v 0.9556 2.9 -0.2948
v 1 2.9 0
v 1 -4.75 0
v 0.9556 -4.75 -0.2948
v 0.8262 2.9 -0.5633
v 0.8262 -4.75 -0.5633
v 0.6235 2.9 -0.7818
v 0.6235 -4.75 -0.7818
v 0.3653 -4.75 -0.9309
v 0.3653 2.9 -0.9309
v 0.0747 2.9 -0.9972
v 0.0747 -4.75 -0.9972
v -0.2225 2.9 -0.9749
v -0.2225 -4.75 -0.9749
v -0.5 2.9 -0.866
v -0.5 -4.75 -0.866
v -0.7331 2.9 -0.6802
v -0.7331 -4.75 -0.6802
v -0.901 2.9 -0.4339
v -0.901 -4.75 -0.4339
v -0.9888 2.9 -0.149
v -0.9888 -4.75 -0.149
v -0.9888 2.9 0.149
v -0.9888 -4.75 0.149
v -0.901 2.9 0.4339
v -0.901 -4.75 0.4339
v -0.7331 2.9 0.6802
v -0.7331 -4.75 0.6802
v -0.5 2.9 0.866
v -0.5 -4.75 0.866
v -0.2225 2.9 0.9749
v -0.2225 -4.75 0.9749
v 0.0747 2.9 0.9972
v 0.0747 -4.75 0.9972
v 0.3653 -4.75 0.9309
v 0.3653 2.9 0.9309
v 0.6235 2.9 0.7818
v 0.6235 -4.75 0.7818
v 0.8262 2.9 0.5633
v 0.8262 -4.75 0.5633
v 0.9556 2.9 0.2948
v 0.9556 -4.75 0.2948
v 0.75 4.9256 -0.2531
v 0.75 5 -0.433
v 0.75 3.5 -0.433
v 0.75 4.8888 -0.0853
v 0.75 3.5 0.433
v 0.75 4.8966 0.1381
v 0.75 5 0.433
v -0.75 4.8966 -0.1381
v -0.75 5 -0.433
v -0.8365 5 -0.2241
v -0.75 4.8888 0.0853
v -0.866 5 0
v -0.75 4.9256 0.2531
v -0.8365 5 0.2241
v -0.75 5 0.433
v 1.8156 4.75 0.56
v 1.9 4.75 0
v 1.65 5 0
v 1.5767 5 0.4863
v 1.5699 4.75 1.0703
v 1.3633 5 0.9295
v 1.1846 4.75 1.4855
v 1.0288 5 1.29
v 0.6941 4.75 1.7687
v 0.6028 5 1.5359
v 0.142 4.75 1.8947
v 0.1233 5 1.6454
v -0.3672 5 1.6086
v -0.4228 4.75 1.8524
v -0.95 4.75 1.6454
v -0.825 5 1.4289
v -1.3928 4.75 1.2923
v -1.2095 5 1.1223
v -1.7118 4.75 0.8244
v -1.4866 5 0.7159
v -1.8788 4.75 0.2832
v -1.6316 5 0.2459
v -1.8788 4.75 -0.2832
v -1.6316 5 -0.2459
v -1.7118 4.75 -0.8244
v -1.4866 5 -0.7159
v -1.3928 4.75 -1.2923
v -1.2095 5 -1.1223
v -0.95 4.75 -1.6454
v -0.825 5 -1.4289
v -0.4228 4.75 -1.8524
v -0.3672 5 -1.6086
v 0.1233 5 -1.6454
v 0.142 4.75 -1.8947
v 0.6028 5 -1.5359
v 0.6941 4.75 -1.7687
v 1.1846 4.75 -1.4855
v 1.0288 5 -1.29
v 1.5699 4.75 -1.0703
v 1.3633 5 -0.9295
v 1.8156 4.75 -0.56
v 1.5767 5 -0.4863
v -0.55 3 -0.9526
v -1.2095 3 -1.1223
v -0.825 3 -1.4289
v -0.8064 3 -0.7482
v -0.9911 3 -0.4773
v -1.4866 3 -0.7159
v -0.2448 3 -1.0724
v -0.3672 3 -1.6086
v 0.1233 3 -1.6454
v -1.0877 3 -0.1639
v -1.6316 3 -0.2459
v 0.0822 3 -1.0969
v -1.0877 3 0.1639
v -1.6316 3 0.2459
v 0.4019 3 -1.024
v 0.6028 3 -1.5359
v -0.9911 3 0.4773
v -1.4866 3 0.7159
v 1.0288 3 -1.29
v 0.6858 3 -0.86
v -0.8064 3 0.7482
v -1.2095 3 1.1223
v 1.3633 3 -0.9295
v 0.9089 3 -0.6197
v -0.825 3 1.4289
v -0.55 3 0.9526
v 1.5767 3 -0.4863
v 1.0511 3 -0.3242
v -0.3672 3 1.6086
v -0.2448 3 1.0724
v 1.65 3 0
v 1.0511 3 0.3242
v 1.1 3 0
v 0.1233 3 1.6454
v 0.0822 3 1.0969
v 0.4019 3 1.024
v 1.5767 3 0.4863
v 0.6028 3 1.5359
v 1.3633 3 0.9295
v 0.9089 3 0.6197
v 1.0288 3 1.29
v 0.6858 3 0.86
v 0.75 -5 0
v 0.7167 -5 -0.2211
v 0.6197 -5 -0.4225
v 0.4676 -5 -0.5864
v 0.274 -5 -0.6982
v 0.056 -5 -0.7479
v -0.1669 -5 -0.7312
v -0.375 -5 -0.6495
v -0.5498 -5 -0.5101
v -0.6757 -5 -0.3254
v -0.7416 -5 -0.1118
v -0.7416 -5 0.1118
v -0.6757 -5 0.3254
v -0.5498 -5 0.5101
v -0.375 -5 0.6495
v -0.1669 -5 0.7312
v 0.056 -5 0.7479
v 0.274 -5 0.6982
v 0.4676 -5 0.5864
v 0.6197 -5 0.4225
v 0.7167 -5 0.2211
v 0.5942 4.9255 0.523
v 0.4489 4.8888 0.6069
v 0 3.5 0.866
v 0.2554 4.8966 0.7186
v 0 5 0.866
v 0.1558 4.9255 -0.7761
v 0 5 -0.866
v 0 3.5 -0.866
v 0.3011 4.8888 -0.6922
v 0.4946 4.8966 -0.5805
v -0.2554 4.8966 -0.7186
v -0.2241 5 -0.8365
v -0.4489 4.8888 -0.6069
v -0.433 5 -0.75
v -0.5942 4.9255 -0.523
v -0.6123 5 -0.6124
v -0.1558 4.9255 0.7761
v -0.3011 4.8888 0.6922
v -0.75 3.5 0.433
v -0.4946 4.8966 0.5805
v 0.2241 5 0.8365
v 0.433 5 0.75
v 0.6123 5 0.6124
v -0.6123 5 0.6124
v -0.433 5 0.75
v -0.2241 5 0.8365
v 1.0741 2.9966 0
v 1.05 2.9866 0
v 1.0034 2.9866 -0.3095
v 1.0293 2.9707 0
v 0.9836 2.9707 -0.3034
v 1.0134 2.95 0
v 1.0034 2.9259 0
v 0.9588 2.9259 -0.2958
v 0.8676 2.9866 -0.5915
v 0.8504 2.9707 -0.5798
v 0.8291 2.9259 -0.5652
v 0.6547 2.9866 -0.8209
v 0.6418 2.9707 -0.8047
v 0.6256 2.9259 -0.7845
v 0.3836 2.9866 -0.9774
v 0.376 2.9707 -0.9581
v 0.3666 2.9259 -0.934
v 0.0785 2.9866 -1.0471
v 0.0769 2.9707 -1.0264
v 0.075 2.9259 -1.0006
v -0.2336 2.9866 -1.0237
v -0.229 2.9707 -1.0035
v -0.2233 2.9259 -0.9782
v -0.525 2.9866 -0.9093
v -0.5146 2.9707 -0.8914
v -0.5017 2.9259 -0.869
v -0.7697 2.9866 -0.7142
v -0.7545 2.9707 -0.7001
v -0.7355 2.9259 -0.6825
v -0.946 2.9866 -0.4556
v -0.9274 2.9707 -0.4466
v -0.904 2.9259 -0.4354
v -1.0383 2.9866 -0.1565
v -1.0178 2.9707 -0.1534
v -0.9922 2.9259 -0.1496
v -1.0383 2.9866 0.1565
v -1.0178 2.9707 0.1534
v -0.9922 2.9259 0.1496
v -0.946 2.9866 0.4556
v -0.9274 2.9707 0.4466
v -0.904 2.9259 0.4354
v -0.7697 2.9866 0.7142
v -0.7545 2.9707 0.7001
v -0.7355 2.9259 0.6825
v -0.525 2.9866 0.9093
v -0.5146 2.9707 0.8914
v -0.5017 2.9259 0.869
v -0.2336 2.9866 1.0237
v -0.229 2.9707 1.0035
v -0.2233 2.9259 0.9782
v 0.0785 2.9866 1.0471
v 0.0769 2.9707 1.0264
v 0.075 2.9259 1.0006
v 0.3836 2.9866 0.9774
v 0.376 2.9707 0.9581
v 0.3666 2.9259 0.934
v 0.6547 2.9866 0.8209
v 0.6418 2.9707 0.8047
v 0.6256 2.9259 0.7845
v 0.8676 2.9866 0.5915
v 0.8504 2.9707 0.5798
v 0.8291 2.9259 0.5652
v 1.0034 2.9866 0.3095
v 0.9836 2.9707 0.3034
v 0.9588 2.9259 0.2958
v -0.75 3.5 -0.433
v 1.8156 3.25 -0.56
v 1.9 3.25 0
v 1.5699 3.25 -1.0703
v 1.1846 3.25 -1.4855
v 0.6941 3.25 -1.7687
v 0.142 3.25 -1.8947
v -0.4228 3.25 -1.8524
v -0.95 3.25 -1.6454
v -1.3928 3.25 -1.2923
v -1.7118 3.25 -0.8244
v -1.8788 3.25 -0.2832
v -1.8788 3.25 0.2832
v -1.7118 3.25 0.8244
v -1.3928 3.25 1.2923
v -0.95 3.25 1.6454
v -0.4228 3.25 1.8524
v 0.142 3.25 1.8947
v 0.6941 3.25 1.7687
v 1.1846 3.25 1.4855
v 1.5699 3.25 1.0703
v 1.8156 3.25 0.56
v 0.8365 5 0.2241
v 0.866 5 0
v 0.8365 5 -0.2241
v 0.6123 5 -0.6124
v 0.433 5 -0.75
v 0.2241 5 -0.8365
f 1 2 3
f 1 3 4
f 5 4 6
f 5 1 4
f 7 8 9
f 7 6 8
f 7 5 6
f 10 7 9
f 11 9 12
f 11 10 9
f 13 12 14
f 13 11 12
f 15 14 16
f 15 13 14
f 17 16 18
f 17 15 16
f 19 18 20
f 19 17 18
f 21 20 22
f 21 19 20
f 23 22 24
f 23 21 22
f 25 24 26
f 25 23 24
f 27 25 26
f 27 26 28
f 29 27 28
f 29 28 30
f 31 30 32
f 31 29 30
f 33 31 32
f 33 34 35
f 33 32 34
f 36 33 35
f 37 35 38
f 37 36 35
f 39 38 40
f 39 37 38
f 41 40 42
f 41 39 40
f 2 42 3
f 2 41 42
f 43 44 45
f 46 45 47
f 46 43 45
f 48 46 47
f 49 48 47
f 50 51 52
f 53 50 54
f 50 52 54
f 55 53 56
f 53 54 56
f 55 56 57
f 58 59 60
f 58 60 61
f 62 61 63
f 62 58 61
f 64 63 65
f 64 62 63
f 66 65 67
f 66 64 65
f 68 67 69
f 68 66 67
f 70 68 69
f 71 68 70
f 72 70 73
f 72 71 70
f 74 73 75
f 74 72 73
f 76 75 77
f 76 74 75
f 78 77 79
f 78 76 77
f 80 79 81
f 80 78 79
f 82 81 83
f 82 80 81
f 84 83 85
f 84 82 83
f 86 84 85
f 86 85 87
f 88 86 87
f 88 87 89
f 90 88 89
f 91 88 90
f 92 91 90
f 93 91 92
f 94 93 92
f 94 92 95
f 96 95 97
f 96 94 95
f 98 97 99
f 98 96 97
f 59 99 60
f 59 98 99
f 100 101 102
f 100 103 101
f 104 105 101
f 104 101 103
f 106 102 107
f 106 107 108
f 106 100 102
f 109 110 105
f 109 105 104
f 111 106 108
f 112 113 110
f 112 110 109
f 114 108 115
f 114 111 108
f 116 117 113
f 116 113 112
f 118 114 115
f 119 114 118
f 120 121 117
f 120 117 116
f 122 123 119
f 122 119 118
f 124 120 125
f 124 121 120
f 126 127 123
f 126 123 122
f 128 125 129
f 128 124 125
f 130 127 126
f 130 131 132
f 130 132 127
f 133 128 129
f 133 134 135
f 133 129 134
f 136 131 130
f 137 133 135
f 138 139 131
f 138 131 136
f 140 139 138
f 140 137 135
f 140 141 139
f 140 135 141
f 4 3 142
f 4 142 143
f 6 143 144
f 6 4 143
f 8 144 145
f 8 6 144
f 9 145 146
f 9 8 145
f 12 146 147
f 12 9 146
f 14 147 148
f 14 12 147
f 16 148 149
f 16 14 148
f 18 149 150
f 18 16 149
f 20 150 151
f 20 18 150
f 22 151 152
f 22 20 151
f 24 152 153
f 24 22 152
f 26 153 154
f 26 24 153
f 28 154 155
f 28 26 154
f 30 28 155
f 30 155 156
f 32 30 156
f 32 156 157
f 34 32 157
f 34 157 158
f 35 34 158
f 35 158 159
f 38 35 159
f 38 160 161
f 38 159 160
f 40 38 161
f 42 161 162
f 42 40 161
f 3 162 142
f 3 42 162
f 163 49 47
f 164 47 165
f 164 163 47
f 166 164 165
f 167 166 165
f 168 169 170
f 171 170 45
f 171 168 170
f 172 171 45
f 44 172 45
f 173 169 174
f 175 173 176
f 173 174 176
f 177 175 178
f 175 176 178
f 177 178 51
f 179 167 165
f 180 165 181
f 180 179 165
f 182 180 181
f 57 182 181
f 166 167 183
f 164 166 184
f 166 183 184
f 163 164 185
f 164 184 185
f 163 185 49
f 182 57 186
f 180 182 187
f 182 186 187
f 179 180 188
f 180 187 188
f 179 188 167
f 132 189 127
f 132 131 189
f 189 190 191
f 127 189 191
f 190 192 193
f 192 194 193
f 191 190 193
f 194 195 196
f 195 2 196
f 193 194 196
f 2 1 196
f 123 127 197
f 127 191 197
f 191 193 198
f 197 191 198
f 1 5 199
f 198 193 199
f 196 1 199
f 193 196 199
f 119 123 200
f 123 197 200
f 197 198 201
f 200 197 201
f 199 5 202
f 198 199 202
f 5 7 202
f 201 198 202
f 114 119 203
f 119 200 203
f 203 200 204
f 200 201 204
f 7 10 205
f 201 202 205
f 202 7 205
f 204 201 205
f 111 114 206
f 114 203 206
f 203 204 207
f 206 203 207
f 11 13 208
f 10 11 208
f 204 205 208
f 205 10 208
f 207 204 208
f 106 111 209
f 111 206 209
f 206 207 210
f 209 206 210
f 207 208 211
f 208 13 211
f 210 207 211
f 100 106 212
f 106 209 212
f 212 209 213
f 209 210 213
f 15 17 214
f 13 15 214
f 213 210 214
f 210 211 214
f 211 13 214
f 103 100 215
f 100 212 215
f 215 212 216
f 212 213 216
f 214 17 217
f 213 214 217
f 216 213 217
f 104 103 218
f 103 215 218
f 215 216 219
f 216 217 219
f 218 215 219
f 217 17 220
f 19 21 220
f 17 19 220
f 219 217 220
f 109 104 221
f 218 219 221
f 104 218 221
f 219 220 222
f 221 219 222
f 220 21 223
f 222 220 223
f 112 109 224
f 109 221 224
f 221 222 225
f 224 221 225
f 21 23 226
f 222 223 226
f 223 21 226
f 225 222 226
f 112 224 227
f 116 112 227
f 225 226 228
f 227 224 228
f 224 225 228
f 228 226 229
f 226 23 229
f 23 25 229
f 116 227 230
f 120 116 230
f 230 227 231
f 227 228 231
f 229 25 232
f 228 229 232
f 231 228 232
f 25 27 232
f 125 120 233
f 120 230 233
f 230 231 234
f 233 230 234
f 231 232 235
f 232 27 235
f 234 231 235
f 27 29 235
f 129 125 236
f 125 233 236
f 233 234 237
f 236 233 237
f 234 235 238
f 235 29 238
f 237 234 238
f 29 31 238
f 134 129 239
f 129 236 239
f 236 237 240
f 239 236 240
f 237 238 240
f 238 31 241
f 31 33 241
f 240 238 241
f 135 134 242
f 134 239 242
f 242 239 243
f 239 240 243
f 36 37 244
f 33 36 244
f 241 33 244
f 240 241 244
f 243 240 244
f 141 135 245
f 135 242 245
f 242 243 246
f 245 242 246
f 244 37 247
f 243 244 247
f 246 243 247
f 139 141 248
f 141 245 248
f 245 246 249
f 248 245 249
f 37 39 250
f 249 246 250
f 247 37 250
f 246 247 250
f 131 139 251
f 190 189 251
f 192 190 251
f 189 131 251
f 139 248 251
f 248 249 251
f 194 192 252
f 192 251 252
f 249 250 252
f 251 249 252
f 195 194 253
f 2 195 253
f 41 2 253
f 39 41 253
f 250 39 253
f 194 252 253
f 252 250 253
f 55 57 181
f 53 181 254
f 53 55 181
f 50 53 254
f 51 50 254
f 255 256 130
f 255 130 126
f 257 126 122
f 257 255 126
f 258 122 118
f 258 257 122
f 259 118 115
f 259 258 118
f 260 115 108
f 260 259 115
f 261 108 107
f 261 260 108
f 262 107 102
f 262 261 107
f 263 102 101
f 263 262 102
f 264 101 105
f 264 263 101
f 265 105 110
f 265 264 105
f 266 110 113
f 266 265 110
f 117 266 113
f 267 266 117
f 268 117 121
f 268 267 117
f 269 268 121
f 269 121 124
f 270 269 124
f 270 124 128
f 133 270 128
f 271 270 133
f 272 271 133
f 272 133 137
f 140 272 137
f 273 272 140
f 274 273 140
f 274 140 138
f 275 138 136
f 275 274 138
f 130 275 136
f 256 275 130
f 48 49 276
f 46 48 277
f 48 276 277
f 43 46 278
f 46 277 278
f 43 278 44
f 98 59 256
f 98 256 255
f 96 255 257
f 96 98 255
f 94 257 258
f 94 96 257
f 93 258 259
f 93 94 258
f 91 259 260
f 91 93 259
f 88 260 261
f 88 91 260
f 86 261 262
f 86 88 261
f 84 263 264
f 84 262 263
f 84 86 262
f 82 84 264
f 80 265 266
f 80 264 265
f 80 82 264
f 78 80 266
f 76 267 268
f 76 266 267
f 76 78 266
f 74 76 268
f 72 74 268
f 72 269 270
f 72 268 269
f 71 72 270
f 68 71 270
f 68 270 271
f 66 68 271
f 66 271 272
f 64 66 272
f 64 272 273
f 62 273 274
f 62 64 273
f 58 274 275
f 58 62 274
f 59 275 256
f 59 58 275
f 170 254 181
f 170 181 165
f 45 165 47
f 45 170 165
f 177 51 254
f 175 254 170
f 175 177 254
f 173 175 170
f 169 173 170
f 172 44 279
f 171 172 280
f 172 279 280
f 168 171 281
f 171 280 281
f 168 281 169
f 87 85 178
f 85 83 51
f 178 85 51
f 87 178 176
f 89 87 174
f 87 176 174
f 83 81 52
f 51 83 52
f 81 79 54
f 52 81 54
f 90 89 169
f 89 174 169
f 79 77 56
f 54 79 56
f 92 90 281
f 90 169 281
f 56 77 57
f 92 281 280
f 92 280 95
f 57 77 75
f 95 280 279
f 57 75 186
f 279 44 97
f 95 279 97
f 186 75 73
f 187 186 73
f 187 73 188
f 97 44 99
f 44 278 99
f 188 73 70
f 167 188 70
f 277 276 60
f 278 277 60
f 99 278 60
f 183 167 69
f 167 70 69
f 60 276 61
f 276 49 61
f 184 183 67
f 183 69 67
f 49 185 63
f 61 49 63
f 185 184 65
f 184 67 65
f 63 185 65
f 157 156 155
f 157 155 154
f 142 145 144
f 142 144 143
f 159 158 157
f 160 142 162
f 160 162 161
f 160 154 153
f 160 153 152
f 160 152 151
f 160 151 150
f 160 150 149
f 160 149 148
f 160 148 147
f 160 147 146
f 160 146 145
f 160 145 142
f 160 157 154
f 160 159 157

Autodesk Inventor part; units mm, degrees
ref_plane "YZ Plane" through (0, 0, 0) normal (1, 0, 0) x (0, 1, 0)
ref_plane "XZ Plane" through (0, 0, 0) normal (0, 1, 0) x (-1, 0, 0)
ref_plane "XY Plane" through (0, 0, 0) normal (0, 0, 1) x (1, 0, 0)
sketch "Sketch1" plane through (0, 0, 0) normal (0, 0, 1) x (1, 0, 0)
  line L0 (0, 5) -> (0, -5)
  line L1 (0, -5) -> (0.75, -5)
  line L2 (0.75, -5) -> (1, -4.75)
  line L3 (1, -4.75) -> (1, 2.9)
  line L4 (1.1, 3) -> (1.65, 3)
  line L5 (1.9, 3.25) -> (1.9, 4.75)
  line L6 (1.65, 5) -> (0, 5)
  arc A0 (1.1, 3) -> (1, 2.9) centre (1.1, 2.9) ccw
  line L7 (1.65, 5) -> (1.9, 4.75)
  line L8 (1.65, 3) -> (1.9, 3.25)
  point P0 (0, 0)
  point P1 (1.9, 3)
  point P2 (1.9, 5)
  point P3 (0, 0)
  dimension "d0" = 3.8
  dimension "d1" = 2
  dimension "d3" = 2
  dimension "d4" = 2.2
  dimension "d5" = 135
  dimension "d6" = 0.25
  dimension "d7" = 8
  dimension "d18" = 0.25
revolve "Revolution1" add sketch "Sketch1" angle 360 about axis through (0, 5, 0) along (0, -1, 0)
sketch "Sketch2" plane through (0, 5, 0) normal (0, 1, 0) x (1, 0, 0)
  line L0 (0, -0.866) -> (-0.75, -0.433)
  line L1 (-0.75, -0.433) -> (-0.75, 0.433)
  line L2 (-0.75, 0.433) -> (0, 0.866)
  line L3 (0, 0.866) -> (0.75, 0.433)
  line L4 (0.75, 0.433) -> (0.75, -0.433)
  line L5 (0.75, -0.433) -> (0, -0.866)
  point P0 (0, 0)
  point P1 (0, 0)
  dimension "d11" = 1.5
extrude "Extrusion1" cut sketch "Sketch2" against normal blind 1.5
thread "Thread1" size "M2x0.4" class "6g" standard "ANSI Metric M Profile" full length
sketch "Sketch3" plane through (0, 0, 0) normal (1, 0, 0) x (0, 1, 0)
  line L0 (5, 0.866) -> (5, 0.433) projected
  line L1 (5, 0.866) -> (4.5, 0.366)
  line L2 (4.5, 0.366) -> (5, 0.366)
  line L3 (5, 0.366) -> (5, 0.866)
  line L4 (-1, 0) -> (6, 0) projected
  point P0 (0, 0)
  dimension "d16" = 0.5
revolve "Revolution2" cut sketch "Sketch3" angle 360 about axis through (0, -10, 0) along (0, 1, 0)
properties part number "Bolt_M2x0.4_8mm_SH" material "Stainless Steel"
